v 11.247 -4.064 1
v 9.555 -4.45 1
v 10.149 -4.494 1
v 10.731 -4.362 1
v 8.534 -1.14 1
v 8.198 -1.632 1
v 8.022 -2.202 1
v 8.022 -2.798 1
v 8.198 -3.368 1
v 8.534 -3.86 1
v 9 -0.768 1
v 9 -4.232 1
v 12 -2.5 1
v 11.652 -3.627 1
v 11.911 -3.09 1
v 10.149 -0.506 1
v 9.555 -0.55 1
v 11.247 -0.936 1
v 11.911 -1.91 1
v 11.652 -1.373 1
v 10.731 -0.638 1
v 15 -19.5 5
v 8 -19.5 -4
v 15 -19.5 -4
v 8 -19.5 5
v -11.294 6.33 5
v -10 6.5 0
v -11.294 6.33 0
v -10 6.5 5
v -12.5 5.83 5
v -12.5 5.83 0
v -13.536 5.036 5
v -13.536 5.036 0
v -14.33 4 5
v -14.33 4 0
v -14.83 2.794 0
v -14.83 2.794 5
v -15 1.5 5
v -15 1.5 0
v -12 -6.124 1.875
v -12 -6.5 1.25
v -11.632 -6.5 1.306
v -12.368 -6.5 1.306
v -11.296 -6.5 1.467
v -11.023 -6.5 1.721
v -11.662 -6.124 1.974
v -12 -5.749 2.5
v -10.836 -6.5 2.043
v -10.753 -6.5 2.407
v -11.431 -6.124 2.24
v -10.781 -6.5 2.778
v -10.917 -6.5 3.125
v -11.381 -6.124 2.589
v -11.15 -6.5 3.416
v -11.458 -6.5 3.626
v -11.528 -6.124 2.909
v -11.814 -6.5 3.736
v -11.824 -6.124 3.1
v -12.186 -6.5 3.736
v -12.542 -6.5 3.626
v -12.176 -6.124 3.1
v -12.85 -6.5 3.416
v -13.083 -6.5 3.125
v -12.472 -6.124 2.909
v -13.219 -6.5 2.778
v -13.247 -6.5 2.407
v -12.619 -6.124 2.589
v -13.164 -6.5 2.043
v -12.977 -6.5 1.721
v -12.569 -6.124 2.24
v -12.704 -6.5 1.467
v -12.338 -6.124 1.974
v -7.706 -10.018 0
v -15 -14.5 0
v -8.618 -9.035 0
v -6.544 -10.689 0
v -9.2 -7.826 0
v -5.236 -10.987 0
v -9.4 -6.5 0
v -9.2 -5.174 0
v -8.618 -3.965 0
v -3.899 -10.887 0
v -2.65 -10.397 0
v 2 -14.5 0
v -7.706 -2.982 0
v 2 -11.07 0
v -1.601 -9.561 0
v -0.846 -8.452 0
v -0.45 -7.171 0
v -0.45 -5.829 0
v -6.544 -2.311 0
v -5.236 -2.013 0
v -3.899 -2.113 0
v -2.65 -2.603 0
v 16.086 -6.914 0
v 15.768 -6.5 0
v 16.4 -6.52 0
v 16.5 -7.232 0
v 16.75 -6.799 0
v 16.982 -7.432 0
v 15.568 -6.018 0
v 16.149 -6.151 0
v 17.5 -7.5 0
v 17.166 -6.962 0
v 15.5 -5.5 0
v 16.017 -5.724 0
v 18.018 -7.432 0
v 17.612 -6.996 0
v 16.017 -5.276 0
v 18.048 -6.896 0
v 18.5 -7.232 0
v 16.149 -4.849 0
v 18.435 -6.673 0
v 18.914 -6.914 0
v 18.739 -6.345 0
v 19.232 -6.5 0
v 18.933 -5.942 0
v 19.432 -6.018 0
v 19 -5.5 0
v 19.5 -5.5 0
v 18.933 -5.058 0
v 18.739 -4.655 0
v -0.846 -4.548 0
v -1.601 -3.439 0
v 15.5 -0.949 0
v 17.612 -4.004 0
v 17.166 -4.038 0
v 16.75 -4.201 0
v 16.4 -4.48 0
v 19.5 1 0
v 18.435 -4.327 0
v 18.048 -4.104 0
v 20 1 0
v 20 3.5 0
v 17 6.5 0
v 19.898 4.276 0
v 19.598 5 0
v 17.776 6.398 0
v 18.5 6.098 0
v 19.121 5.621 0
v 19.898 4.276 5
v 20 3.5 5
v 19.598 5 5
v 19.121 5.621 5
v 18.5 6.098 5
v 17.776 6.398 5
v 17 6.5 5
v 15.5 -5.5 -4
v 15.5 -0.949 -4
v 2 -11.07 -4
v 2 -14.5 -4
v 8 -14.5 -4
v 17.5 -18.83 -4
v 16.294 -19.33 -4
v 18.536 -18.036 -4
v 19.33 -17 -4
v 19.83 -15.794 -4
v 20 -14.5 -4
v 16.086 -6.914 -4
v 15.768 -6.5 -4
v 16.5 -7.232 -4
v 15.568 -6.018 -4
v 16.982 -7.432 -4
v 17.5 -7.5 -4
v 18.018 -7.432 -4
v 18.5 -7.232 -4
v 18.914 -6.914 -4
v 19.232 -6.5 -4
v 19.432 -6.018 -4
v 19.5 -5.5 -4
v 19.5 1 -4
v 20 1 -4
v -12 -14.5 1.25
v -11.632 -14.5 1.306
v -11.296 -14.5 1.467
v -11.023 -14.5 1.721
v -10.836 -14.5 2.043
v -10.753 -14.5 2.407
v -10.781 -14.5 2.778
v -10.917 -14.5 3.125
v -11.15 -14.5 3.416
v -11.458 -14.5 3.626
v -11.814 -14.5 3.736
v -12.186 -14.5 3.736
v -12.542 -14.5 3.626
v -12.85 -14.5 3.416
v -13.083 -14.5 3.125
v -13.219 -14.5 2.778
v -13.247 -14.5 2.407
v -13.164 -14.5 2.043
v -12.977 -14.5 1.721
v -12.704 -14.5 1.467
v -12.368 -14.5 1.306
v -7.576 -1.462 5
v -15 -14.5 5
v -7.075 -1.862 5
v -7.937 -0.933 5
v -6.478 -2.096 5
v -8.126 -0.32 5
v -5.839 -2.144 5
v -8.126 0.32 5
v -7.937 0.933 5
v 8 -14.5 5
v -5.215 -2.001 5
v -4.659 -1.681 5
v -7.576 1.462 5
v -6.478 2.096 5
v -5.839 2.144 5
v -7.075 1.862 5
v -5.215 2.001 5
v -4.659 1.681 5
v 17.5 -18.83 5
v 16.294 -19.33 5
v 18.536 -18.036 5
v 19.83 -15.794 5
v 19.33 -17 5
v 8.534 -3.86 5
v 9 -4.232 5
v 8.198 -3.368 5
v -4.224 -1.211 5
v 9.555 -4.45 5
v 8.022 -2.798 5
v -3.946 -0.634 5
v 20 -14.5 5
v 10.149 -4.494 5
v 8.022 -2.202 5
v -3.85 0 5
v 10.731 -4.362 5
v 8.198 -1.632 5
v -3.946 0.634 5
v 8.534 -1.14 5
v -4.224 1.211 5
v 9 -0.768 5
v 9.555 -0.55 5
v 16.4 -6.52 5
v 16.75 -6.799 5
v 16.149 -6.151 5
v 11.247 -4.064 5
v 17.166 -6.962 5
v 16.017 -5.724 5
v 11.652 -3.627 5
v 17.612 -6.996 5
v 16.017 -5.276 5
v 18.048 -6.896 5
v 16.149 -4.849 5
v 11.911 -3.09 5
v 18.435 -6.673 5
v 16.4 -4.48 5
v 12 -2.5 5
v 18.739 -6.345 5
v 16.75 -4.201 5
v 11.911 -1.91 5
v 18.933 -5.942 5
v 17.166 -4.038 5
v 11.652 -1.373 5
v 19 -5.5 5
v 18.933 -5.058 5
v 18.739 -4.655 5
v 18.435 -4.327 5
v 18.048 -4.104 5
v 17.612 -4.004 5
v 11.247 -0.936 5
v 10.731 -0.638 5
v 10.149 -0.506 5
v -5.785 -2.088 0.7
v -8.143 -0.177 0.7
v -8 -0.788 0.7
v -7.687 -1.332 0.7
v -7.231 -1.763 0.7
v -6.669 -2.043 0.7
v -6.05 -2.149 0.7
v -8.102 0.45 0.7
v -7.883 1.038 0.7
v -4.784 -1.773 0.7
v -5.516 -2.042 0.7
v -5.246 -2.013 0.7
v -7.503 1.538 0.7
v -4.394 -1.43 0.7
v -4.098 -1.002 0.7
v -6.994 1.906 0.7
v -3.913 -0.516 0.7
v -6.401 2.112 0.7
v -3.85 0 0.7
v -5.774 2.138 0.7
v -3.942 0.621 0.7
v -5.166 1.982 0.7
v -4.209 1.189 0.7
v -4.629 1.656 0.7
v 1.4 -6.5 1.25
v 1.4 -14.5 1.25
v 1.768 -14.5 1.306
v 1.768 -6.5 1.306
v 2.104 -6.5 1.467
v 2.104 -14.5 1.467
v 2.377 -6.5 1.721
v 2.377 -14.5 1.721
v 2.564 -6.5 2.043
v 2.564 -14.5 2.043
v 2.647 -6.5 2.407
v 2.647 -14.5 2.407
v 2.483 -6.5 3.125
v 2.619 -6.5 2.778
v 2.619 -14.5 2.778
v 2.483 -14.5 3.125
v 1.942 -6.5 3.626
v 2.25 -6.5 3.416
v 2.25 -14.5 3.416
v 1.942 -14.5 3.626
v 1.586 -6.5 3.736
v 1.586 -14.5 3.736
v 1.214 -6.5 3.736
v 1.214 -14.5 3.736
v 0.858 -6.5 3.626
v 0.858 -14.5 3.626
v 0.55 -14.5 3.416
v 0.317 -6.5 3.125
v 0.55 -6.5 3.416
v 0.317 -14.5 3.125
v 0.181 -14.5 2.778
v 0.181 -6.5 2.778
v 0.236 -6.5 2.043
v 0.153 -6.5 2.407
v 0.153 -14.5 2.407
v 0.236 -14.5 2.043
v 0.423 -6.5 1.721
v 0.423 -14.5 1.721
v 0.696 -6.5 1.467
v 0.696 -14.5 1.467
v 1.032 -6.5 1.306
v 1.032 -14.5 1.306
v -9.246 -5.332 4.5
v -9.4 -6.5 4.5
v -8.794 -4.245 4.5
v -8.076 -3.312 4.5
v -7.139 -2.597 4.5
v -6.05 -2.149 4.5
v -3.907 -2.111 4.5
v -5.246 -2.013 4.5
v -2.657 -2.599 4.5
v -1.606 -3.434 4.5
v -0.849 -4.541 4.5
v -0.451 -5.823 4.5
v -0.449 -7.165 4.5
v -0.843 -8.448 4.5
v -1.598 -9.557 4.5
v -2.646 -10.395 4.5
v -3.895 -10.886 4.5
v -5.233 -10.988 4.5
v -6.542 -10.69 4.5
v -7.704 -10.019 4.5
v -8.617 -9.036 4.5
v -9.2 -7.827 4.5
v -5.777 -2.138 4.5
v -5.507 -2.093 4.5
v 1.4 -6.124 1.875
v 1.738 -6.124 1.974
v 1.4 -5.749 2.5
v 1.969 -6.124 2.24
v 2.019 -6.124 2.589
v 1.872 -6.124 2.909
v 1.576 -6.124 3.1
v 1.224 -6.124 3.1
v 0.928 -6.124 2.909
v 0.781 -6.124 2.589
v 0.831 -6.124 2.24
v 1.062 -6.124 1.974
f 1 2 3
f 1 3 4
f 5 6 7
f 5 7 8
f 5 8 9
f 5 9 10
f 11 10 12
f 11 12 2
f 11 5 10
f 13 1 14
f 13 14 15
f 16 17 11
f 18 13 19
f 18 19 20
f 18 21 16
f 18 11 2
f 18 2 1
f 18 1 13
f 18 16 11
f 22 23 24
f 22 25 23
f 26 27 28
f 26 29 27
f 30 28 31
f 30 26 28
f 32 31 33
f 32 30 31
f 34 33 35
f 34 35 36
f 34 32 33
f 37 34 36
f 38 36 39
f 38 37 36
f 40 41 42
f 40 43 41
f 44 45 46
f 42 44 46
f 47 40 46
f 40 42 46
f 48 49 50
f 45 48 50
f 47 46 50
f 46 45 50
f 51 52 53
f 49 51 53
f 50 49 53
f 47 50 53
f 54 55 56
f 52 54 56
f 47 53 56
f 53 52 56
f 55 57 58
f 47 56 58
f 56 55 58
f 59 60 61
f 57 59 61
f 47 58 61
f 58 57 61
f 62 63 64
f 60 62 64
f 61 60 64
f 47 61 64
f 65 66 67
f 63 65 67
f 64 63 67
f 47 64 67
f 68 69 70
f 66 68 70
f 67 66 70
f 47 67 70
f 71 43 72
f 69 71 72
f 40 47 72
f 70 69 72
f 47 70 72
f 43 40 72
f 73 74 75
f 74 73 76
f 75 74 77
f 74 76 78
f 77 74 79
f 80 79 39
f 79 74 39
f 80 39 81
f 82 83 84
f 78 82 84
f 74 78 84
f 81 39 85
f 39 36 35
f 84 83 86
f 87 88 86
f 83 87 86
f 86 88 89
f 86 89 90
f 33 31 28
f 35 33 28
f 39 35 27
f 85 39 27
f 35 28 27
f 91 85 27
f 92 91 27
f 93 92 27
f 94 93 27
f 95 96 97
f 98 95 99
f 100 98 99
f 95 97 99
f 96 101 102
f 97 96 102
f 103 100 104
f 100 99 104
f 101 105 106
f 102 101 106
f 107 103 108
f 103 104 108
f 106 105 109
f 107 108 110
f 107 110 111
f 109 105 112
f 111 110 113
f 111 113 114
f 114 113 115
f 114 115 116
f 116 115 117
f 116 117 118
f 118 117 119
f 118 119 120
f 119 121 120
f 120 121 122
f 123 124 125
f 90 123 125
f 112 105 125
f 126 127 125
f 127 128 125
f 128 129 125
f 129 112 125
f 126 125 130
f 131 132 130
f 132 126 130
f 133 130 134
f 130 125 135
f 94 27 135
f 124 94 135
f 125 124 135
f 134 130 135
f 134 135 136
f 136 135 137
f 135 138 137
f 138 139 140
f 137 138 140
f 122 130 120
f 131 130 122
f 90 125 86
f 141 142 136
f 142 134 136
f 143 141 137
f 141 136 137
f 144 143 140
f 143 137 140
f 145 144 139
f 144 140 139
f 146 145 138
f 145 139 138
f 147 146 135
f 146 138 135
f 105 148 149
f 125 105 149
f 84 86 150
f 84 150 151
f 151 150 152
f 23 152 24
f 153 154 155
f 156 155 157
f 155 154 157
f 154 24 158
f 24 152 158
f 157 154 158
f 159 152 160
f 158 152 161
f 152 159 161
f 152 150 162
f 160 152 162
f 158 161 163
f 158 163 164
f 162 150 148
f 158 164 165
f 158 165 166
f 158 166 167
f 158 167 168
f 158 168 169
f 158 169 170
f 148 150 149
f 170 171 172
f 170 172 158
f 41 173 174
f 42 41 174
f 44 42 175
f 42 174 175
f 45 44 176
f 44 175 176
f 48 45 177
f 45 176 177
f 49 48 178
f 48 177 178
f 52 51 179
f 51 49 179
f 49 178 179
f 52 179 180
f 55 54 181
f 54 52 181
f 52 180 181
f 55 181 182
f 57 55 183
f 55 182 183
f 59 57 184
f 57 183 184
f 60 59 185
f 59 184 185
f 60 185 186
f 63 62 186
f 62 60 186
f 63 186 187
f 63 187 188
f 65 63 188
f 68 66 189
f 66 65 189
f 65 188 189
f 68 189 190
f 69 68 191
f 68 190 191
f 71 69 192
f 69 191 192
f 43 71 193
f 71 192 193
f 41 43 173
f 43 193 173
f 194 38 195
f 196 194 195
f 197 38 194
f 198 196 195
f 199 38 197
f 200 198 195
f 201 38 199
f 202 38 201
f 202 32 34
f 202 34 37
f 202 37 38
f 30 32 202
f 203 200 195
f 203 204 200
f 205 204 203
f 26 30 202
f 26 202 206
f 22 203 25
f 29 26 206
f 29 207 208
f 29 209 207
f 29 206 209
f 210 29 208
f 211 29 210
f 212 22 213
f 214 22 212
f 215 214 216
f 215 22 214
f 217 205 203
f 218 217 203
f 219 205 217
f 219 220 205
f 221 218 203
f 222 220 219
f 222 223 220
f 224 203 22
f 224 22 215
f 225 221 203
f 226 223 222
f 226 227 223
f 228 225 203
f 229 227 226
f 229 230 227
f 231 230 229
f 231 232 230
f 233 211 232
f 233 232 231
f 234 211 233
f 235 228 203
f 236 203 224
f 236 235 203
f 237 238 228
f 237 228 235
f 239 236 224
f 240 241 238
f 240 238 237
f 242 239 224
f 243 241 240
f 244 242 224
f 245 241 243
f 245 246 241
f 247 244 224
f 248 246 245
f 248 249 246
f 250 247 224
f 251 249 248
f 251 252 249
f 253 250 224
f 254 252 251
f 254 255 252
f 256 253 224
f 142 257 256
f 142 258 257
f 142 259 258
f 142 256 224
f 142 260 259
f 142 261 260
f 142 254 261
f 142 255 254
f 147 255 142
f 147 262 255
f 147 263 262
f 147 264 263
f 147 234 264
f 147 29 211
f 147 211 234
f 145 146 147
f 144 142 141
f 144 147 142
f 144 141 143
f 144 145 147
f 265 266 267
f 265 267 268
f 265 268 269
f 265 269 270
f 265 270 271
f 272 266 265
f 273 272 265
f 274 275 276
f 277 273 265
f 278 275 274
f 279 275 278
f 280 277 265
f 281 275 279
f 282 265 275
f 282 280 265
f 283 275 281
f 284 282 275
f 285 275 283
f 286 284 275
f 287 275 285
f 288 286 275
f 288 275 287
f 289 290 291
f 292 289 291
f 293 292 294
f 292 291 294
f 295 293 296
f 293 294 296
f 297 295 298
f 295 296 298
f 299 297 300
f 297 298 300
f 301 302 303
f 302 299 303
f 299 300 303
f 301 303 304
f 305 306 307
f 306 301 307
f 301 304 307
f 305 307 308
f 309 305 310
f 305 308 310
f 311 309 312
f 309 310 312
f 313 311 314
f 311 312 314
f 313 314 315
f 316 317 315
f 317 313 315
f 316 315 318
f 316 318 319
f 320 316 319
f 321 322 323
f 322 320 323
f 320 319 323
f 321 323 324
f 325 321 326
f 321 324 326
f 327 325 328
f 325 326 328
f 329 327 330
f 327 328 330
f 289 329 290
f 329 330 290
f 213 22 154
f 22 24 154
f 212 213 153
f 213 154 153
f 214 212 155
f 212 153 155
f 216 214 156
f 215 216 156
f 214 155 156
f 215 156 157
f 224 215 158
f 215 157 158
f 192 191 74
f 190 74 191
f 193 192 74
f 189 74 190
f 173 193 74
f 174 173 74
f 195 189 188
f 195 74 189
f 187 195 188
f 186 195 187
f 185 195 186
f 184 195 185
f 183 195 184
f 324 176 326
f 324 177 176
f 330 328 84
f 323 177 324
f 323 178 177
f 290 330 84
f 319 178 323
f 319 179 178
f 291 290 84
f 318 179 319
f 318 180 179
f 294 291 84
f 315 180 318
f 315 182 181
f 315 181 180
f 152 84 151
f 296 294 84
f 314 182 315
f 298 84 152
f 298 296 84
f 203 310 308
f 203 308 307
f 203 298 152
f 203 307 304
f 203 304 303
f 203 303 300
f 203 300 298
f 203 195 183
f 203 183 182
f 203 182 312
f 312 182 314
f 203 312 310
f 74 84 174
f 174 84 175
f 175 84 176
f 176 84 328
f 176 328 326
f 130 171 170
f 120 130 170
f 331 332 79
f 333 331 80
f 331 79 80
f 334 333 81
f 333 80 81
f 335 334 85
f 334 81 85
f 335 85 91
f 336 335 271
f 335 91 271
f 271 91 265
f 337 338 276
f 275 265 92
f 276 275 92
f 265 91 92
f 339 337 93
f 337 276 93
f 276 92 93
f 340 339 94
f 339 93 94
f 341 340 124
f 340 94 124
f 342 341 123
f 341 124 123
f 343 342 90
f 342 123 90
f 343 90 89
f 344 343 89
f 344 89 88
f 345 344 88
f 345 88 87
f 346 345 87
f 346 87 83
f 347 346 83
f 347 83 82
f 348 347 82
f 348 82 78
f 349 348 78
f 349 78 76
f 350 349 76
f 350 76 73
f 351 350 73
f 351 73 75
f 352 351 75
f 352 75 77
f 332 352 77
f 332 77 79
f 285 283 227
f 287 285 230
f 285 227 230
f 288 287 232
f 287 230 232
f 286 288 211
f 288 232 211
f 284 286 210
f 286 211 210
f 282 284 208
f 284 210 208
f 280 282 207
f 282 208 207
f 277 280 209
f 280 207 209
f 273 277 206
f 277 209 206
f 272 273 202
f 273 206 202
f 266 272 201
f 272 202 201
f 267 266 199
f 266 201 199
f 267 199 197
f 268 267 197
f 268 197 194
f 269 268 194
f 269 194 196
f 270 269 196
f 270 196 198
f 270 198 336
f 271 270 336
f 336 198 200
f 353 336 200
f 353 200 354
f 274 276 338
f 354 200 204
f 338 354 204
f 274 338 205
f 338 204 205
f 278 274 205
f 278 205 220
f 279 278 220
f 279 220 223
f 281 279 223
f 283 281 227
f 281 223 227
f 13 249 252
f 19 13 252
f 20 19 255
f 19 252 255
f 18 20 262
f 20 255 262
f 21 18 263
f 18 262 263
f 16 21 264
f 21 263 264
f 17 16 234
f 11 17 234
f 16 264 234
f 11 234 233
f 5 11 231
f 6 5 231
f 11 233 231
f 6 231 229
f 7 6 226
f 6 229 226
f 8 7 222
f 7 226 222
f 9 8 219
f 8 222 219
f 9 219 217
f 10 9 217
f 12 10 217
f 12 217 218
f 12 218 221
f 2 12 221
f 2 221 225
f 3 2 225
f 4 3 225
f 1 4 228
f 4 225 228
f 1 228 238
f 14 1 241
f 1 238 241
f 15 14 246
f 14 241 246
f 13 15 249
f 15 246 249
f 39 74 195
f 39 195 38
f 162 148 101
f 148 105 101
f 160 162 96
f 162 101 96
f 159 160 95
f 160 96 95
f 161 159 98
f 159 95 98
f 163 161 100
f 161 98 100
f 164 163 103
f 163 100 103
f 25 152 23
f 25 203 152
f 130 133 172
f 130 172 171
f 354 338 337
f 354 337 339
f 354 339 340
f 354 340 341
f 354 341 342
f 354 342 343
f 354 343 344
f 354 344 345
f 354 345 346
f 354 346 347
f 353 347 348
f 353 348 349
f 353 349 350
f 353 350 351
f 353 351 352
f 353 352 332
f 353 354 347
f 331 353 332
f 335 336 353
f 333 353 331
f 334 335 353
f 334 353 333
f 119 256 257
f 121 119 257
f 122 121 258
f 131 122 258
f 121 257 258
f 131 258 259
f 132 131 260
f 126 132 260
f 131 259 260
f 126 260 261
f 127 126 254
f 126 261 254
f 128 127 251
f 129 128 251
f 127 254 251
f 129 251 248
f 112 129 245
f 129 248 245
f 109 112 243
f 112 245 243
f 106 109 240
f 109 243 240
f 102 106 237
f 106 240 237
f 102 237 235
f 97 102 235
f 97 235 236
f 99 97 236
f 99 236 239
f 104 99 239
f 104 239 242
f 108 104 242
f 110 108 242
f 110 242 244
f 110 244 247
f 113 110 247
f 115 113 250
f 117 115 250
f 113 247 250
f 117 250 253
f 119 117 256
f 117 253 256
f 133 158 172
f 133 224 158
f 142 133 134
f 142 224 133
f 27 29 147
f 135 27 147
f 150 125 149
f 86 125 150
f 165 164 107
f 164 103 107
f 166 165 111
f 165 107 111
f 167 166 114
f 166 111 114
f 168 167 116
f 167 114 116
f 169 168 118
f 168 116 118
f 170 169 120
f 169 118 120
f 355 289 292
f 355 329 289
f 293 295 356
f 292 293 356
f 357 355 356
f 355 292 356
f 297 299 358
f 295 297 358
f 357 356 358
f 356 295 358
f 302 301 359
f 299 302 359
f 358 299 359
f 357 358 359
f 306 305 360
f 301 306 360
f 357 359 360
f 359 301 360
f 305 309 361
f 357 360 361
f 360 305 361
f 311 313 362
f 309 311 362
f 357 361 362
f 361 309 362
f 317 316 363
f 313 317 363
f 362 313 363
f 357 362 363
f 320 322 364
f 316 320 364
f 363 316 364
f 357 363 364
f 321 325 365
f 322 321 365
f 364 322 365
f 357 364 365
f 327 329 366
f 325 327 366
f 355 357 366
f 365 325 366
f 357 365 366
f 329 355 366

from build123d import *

# Parameters (mm, degrees)
SKETCH1_W             = 23
SKETCH1_H             = 21
EXTRUDE1_DEPTH        = 5
SKETCH2_R             = 2.15
EXTRUDE2_DEPTH        = 4.3
SKETCH3_R             = 4.5
EXTRUDE3_DEPTH        = 4.5
SKETCH4_R             = 1.25
EXTRUDE4_DEPTH        = 8
SKETCH7_W             = 12
SKETCH7_H             = 26
EXTRUDE6_DEPTH        = 5
SKETCH9_R             = 1.5
EXTRUDE8_DEPTH        = 5
SKETCH8_R             = 2
EXTRUDE7_DEPTH        = 4
FILLET2_R             = 3
M3_TAPPED_HOLE1_D     = 2.5
M3_TAPPED_HOLE1_DEPTH = 8
M3_TAPPED_HOLE1_TIP   = 0.751075774
EXTRUDE9_DEPTH        = 4
FILLET1_R             = 5
EXTRUDE10_DEPTH       = 4
FILLET3_R             = 2


with BuildPart() as part:
    # Sketch1 → Extrude1 (new body)
    with BuildSketch(Plane.XY):
        with Locations((-3.5, -4)):
            Rectangle(SKETCH1_W, SKETCH1_H)
    extrude(amount=EXTRUDE1_DEPTH)

    # Sketch2 → Extrude2 (cut)
    with BuildSketch(Plane.XY.offset(5)):
        with Locations((-6, 0)):
            Circle(SKETCH2_R)
    extrude(amount=-EXTRUDE2_DEPTH, mode=Mode.SUBTRACT)

    # Sketch3 → Extrude3 (cut)
    with BuildSketch(Plane(origin=(0, 0, 0), x_dir=(-1, 0, 0), z_dir=(0, 0, -1))):
        with Locations((4.9, -6.5)):
            Circle(SKETCH3_R)
    extrude(amount=-EXTRUDE3_DEPTH, mode=Mode.SUBTRACT)

    # Sketch4 → Extrude4 (cut)
    with BuildSketch(Plane.XZ.offset(14.5)):
        with Locations(Location((-12, 2.5, 0), (0, 0, 270))):
            Circle(SKETCH4_R)
        with Locations(Location((1.4, 2.5, 0), (0, 0, 270))):
            Circle(SKETCH4_R)
    extrude(amount=-EXTRUDE4_DEPTH, mode=Mode.SUBTRACT)

    # Sketch7 → Extrude6 (add)
    with BuildSketch(Plane.XY.offset(5)):
        with Locations((14, -6.5)):
            Rectangle(SKETCH7_W, SKETCH7_H)
    extrude(amount=-EXTRUDE6_DEPTH)

    # Sketch9 → Extrude8 (cut)
    with BuildSketch(Plane.XY.offset(5)):
        with Locations((17.5, -5.5)):
            Circle(SKETCH9_R)
    extrude(amount=-EXTRUDE8_DEPTH, mode=Mode.SUBTRACT)

    # Sketch8 → Extrude7 (cut)
    with BuildSketch(Plane.XY.offset(5)):
        with Locations((10, -2.5)):
            Circle(SKETCH8_R)
    extrude(amount=-EXTRUDE7_DEPTH, mode=Mode.SUBTRACT)

    # Fillet2
    fillet2_edges = [part.edges().sort_by_distance(p)[0] for p in [
        (20, 6.5, 2.5),
        (20, -19.5, 2.5),
    ]]
    fillet(fillet2_edges, radius=FILLET2_R)

    # M3 Tapped Hole1
    with Locations(Plane(origin=(-12, -14.5, 2.5), x_dir=(0, 0, -1), z_dir=(0, -1, 0))):
        with Locations((0, 0), (0, 13.4)):
            Hole(M3_TAPPED_HOLE1_D / 2, depth=M3_TAPPED_HOLE1_DEPTH)
            with Locations((0, 0, -(M3_TAPPED_HOLE1_DEPTH + M3_TAPPED_HOLE1_TIP / 2))):  # 118° drill point
                Cone(0, M3_TAPPED_HOLE1_D / 2, M3_TAPPED_HOLE1_TIP, mode=Mode.SUBTRACT)

    # Sketch11 → Extrude9 (add)
    with BuildSketch(Plane(origin=(0, 0, 0), x_dir=(-1, 0, 0), z_dir=(0, 0, -1))):
        Polygon((-8, -19.5), (-20, -19.5), (-20, 1), (-18.1, 1), (-2, -11.07), (-2, -14.5), (-8, -14.5), align=None)
    extrude(amount=EXTRUDE9_DEPTH)

    # Fillet1
    fillet1_edges = [part.edges().sort_by_distance(p)[0] for p in [
        (-15, 6.5, 2.5),
        (20, -19.5, -2),
    ]]
    fillet(fillet1_edges, radius=FILLET1_R)

    # Sketch12 → Extrude10 (cut)
    with BuildSketch(Plane(origin=(0, 0, -4), x_dir=(-1, 0, 0), z_dir=(0, 0, -1))):
        Polygon((-19.5, 1), (-19.5, -7.5), (-15.5, -7.5), (-15.5, -0.949192547), (-18.1, 1), align=None)
    extrude(amount=-EXTRUDE10_DEPTH, mode=Mode.SUBTRACT)

    # Fillet3
    fillet3_edges = [part.edges().sort_by_distance(p)[0] for p in [
        (15.5, -7.5, -2),
        (19.5, -7.5, -2),
    ]]
    fillet(fillet3_edges, radius=FILLET3_R - 0.0001)  # a hair under: the kernel refuses the full size


solid = part.part
